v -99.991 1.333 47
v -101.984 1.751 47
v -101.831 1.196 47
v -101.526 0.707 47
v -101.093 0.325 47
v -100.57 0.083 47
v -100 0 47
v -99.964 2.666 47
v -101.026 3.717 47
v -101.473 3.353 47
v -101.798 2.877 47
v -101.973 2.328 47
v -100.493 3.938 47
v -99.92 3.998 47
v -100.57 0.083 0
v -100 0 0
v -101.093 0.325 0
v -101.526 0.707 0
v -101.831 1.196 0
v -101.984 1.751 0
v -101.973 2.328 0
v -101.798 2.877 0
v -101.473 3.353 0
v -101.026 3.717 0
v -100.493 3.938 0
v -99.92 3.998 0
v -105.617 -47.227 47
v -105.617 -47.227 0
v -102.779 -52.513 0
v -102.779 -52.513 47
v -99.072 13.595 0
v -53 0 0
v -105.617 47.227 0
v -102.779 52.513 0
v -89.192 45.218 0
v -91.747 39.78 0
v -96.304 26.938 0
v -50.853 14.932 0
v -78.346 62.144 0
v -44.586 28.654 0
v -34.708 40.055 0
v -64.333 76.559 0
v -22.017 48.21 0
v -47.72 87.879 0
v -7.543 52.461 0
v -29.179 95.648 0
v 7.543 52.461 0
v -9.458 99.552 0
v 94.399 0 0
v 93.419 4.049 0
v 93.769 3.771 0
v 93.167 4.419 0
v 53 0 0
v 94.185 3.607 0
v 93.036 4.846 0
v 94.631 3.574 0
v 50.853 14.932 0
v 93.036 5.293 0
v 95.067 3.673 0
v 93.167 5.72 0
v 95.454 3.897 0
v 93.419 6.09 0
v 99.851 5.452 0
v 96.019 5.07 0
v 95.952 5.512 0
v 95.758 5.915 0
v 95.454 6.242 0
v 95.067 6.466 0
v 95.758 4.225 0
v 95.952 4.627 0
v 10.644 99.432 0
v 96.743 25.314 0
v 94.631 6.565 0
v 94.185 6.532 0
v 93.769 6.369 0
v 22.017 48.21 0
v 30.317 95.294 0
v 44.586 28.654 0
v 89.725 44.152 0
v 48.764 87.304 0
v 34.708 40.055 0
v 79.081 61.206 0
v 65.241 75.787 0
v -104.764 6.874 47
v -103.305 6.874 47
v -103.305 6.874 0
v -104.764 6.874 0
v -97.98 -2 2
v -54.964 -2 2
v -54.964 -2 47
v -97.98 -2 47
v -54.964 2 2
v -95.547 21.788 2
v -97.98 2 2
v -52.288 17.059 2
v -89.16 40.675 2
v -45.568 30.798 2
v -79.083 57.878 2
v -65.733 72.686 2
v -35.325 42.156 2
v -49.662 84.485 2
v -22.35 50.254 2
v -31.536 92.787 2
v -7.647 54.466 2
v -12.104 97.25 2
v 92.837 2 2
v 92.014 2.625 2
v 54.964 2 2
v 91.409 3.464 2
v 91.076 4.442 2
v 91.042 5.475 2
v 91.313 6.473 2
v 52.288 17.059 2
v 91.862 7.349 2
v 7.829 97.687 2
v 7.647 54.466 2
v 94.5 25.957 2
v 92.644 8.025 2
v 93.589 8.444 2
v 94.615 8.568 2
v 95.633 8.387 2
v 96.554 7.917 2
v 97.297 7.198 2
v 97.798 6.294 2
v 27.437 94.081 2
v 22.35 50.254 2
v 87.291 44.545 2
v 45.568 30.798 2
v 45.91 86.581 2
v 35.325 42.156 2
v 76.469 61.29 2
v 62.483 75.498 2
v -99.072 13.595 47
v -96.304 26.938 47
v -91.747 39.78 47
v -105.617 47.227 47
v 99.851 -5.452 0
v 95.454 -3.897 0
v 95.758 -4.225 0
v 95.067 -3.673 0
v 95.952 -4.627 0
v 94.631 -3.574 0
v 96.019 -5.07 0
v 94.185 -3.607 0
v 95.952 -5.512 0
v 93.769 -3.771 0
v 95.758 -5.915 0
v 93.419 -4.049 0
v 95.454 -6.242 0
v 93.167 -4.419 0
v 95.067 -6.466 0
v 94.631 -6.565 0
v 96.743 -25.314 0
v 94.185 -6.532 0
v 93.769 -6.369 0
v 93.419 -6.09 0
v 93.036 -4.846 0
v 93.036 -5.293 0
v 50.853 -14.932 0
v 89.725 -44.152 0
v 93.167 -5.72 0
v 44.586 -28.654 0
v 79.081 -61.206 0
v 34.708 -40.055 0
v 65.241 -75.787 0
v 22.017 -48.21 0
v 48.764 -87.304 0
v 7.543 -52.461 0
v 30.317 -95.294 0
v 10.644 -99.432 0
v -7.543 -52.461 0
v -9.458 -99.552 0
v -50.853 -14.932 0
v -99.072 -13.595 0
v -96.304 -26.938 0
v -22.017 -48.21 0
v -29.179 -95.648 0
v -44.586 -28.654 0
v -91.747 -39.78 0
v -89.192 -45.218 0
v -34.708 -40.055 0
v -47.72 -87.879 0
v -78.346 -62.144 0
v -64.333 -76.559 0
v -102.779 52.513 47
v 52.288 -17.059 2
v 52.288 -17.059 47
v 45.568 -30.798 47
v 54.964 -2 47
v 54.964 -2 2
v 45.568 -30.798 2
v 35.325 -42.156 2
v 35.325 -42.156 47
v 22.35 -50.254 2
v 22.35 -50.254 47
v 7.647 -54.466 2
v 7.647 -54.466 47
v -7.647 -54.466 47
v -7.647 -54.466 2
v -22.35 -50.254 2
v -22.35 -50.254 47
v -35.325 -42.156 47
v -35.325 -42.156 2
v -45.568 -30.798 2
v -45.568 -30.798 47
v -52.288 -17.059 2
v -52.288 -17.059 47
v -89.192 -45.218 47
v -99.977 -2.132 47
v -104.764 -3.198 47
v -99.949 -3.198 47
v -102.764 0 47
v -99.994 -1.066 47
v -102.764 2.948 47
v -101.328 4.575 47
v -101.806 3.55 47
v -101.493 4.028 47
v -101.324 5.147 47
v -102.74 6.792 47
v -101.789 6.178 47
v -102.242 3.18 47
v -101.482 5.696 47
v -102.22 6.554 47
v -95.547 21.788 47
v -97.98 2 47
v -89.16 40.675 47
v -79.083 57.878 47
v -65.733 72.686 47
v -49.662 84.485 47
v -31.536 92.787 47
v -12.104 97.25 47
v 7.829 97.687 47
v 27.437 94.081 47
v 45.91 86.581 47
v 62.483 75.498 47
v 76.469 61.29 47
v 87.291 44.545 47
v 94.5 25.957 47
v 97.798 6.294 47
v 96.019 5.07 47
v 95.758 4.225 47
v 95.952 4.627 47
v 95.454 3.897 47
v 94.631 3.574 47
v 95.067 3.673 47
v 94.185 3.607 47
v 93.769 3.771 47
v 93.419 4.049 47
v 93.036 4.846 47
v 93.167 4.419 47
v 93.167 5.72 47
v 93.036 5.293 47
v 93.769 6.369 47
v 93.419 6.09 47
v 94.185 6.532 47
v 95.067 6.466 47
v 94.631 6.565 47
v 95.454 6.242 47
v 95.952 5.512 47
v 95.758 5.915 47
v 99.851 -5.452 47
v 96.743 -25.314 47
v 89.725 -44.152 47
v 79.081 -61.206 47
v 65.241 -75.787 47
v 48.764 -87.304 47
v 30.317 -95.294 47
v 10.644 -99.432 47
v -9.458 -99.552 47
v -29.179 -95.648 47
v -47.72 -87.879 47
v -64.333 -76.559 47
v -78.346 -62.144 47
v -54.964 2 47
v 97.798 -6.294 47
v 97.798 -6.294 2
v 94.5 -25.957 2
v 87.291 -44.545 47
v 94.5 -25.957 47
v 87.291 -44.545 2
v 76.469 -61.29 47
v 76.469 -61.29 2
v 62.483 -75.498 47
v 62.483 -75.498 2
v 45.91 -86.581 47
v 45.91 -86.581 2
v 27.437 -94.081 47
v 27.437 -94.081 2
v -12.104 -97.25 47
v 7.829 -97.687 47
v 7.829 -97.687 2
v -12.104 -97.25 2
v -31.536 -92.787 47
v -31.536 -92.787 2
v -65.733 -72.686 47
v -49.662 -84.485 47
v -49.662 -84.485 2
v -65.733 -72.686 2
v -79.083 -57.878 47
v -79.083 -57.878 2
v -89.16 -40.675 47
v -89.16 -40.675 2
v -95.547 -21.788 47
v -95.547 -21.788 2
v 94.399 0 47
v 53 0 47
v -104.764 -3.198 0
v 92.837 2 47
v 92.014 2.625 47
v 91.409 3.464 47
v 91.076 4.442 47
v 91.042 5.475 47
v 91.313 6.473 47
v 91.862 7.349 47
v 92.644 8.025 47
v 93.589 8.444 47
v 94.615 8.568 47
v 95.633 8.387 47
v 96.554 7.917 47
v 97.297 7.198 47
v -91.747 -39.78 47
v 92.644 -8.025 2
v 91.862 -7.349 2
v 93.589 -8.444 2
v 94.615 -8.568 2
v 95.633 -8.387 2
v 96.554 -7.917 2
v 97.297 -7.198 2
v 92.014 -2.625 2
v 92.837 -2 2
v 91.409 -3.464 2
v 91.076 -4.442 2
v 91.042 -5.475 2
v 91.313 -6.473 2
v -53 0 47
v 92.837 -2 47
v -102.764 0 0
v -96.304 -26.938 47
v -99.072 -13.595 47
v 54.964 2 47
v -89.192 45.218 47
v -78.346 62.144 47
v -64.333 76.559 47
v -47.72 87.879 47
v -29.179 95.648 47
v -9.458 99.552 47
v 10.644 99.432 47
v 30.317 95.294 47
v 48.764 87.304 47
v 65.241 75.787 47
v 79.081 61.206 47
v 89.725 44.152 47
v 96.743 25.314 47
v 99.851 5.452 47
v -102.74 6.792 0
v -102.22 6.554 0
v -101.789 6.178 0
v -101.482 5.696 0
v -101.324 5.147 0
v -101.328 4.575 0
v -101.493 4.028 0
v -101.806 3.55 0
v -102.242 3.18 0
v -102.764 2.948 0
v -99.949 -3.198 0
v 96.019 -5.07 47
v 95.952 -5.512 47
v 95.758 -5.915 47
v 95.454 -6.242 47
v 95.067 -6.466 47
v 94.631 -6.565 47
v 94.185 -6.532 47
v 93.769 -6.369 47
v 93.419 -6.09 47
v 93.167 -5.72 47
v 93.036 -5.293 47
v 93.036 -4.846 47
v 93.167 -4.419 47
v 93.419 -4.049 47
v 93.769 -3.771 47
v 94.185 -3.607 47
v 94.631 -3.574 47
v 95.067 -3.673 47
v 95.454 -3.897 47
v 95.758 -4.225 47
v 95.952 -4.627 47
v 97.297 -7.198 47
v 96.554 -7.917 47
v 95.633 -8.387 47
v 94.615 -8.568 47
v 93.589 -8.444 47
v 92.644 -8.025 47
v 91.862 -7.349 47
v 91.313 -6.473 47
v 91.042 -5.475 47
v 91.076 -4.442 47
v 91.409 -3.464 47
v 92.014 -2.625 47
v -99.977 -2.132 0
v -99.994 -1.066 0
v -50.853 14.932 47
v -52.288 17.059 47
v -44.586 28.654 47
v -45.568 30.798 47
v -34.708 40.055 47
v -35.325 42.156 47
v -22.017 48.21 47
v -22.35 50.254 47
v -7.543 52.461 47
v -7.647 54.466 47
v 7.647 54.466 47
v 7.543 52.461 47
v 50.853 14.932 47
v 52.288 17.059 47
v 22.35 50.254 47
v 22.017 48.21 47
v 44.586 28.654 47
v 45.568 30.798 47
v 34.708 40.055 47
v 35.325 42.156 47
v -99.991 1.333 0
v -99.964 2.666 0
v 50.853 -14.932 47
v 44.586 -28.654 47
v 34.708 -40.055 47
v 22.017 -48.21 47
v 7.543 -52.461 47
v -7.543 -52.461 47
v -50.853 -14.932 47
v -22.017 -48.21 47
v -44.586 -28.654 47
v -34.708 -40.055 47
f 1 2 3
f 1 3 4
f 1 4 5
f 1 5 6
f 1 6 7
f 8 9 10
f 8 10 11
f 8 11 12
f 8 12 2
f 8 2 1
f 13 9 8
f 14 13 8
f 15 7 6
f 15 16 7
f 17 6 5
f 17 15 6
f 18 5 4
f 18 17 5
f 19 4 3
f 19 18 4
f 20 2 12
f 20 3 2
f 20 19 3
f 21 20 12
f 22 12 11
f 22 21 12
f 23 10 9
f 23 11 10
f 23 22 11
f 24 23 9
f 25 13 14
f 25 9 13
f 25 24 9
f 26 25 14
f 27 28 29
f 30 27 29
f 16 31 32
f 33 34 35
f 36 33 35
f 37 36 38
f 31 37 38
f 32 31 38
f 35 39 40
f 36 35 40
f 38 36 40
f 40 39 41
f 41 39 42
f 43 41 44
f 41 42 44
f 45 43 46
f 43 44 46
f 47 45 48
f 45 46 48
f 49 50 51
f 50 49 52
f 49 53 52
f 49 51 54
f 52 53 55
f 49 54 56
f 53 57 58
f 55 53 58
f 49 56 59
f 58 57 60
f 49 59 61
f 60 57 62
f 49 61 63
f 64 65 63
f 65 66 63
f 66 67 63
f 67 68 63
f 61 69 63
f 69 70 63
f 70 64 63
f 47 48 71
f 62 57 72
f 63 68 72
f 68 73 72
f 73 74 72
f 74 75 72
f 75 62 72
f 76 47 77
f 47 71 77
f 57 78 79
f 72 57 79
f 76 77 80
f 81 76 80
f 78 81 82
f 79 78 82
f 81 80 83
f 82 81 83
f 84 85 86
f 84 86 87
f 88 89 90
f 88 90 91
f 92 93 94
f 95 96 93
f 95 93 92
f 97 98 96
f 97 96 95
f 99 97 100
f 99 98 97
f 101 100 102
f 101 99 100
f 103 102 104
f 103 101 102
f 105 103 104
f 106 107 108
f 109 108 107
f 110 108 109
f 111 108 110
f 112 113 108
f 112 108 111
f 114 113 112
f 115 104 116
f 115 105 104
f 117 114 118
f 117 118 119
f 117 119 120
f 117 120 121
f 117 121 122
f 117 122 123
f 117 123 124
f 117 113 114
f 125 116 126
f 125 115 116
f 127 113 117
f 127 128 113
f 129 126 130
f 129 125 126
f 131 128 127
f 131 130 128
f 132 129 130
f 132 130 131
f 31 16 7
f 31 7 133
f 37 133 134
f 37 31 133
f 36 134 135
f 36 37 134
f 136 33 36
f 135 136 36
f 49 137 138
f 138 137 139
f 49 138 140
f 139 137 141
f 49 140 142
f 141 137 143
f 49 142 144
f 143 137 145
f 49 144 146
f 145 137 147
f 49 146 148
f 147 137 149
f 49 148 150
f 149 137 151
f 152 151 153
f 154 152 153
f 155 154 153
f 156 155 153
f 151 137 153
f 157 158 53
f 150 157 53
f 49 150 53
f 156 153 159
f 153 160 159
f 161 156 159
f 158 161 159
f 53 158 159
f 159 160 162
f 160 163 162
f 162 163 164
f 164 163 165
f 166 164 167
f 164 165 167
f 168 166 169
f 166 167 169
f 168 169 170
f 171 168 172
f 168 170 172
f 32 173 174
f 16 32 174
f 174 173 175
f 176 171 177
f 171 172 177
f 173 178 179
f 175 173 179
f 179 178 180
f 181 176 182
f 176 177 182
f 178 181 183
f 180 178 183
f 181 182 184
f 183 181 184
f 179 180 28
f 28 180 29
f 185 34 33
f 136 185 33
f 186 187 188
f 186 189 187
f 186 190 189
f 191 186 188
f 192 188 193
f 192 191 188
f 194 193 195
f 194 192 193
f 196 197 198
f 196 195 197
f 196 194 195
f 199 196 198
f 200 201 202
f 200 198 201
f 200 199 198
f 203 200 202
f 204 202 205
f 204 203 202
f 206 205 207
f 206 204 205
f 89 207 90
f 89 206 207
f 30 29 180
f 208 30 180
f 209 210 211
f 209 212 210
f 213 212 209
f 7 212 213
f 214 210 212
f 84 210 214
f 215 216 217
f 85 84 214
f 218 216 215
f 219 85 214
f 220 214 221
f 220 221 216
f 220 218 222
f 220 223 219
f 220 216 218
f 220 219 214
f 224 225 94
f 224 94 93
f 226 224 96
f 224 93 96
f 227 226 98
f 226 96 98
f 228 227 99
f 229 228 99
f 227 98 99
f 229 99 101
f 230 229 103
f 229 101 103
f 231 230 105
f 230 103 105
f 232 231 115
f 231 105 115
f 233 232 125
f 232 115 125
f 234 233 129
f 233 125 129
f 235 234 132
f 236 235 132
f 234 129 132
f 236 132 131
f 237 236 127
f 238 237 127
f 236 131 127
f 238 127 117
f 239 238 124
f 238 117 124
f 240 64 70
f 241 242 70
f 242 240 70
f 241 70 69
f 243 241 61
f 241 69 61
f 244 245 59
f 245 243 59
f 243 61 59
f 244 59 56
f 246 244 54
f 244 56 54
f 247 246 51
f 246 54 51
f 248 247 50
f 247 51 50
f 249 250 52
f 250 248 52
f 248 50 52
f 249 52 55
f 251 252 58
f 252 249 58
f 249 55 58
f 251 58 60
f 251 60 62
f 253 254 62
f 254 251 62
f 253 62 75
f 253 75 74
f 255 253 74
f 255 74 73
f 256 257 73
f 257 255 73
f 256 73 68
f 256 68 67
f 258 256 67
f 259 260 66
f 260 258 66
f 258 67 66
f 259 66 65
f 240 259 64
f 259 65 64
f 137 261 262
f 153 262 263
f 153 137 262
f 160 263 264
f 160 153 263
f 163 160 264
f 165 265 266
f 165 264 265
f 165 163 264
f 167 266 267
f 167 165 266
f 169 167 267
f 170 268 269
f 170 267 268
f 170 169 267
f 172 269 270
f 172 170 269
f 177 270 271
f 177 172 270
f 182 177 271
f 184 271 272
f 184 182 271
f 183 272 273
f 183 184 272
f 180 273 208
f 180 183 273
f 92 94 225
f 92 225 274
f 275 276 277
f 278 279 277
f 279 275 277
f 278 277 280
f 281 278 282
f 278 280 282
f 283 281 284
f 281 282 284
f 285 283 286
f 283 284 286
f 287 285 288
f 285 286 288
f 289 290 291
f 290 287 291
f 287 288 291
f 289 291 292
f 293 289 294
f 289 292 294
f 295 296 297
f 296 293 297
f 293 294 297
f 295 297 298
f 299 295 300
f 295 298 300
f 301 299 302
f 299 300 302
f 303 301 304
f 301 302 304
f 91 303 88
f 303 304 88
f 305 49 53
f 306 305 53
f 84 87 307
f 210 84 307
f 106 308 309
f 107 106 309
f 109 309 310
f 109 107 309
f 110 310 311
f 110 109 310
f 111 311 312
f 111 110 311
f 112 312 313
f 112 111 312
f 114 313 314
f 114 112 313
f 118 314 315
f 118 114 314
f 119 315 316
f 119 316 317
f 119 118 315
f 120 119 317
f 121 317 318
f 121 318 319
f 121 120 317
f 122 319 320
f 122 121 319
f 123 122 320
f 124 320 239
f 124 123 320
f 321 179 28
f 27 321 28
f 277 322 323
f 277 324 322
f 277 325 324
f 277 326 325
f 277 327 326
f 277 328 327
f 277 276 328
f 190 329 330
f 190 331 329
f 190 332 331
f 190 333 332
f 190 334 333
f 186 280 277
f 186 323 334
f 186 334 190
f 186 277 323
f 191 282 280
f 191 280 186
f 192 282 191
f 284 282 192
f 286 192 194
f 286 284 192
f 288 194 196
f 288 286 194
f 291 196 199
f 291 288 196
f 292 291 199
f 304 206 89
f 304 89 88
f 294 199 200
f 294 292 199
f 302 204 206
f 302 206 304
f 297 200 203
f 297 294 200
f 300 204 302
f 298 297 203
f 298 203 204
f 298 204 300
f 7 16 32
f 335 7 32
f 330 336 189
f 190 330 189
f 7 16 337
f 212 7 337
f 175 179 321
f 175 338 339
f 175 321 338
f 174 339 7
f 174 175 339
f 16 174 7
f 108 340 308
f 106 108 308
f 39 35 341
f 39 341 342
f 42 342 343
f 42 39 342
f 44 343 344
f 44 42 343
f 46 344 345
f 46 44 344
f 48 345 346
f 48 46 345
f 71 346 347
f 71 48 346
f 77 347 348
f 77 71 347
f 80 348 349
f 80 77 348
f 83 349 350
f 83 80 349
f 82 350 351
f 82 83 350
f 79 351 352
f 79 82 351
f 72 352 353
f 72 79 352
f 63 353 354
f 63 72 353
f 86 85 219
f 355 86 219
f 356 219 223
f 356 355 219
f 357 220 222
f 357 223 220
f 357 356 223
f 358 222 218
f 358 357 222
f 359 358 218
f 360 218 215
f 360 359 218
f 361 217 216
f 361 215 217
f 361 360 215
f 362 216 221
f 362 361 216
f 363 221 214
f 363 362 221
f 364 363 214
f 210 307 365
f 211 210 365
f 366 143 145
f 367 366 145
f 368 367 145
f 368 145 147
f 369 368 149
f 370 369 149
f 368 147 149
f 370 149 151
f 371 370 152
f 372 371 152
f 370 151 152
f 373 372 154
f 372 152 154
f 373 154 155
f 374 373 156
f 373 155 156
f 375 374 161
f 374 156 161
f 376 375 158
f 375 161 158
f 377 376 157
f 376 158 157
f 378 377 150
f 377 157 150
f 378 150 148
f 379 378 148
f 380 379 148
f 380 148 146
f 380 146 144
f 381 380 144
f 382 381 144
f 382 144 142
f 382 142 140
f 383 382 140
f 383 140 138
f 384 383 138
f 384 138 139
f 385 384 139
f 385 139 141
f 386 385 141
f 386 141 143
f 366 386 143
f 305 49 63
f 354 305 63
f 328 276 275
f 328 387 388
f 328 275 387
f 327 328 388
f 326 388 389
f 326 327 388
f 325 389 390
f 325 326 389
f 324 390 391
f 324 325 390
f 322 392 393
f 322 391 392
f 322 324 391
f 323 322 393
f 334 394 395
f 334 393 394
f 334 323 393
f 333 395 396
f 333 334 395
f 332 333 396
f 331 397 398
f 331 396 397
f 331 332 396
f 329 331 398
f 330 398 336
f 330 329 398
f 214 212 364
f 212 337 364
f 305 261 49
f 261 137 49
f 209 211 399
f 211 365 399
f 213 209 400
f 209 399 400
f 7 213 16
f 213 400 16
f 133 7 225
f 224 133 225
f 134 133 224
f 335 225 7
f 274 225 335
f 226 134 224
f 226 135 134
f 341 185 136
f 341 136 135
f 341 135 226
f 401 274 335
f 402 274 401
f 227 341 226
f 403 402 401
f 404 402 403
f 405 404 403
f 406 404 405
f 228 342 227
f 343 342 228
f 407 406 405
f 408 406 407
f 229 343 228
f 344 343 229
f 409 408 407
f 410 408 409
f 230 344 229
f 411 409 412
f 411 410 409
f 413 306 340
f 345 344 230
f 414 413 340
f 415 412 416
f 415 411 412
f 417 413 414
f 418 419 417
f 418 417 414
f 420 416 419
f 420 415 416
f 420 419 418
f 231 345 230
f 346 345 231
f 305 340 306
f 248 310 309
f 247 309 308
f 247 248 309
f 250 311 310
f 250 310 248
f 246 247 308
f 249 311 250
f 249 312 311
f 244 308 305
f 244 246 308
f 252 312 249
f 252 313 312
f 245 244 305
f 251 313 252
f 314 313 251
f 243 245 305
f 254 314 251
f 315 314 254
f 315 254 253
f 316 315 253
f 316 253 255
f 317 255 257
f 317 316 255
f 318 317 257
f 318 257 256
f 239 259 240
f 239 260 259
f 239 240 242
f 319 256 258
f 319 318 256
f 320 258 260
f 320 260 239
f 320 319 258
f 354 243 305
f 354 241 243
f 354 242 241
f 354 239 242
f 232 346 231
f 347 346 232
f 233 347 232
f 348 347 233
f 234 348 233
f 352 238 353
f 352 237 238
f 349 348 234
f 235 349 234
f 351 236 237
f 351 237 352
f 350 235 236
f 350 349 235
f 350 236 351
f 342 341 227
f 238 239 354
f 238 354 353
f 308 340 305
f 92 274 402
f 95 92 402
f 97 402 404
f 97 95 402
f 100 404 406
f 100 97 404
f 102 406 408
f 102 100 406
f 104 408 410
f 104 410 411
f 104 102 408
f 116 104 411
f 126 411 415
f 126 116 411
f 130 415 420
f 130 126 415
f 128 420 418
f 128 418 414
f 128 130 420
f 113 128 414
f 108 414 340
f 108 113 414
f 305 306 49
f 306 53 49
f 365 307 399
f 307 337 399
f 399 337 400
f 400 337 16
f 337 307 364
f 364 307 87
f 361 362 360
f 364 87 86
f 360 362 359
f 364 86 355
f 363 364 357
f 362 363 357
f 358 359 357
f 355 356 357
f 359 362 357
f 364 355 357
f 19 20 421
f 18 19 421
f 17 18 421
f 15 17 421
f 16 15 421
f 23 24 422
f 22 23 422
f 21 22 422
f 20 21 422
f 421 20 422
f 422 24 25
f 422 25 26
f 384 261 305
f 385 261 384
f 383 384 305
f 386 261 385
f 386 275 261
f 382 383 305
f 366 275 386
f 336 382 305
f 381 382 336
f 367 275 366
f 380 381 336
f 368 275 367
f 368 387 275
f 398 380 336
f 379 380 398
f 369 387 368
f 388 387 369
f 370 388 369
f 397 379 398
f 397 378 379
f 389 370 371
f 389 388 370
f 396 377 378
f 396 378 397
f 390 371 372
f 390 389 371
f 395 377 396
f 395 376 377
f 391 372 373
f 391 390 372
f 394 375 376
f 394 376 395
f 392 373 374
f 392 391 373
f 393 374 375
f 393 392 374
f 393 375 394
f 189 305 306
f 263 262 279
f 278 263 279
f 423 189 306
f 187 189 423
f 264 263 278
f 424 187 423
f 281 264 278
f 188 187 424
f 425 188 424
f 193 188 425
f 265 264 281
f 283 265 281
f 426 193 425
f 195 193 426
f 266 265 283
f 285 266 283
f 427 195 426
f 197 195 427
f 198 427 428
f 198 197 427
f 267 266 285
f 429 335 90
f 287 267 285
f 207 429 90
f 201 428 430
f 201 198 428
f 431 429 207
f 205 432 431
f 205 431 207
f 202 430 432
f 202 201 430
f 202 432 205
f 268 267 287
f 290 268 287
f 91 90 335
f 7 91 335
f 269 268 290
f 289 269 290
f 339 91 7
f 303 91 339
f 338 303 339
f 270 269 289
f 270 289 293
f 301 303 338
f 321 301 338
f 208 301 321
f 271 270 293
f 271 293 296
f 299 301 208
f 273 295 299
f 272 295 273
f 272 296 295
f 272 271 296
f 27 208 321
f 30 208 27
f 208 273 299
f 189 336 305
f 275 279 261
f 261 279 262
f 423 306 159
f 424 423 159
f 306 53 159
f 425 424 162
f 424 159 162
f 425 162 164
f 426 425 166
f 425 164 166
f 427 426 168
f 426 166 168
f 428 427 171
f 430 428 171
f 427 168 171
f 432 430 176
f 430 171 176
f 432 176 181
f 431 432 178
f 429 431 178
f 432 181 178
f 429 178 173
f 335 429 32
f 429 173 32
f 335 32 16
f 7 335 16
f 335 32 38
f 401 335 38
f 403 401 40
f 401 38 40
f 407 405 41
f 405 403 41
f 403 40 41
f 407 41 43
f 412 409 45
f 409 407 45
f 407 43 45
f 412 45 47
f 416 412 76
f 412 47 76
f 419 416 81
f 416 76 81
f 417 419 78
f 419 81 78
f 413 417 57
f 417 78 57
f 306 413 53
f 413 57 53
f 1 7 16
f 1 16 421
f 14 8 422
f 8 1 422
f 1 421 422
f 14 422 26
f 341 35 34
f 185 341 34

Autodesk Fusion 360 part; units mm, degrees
sketch "Sketch1" plane through (0, 0, 0) normal (0, 0, 1) x (1, 0, 0)
  arc A0 (100, 0) -> (-100, 0) centre (0, 0) ccw
  line L0 (0, 0) -> (100, 0) construction
  line L1 (0, 0) -> (-100, 0) construction
  arc A1 (53, 0) -> (-53, 0) centre (0, 0) ccw
  line L2 (0, 0) -> (53, 0) construction
  line L3 (0, 0) -> (-53, 0) construction
  line L4 (-100, 0) -> (-53, 0)
  line L5 (53, 0) -> (100, 0)
  line L6 (94.399, 0) -> (99.8513, 5.4523)
  line L7 (94.399, 0) -> (102.1097, 0) construction
  line L8 (-89.1925, 45.2184) -> (-102.7789, 52.5129)
  line L9 (-102.7789, 52.5129) -> (-105.6171, 47.2267)
  line L10 (-105.6171, 47.2267) -> (-91.7472, 39.78)
  circle A2 centre (94.5188, 5.0696) radius 1.5
  circle A3 centre (94.5188, 5.0696) radius 2.5
  dimension "d1" = 100
  dimension "d5" = 47
  dimension "d6" = 45
  dimension "d7" = 6
  dimension "d11" = 3
  dimension "d12" = 2
  dimension "d13" = 5
extrude "Extrude1" add sketch "Sketch1" along normal blind 47 contours A0 A1 L4 L5 L6 | A3 makes body 1
shell "Shell1" thickness 2 removed faces 1 at (80.8693, 23.265, 47) on bodies 1
extrude "Extrude2" add sketch "Sketch1" along normal up to surface (47 mm away) contours A0 L8 L9 L10 bodies 1
mirror "Mirror1" about plane through (0, 0, 0) normal (0, 1, 0) of bodies 1 makes body 2
sketch "Sketch2" plane through (0, 0, 0) normal (0, 0, 1) x (1, 0, 0)
  arc A0 (100, 0) -> (-100, 0) centre (0, 0) ccw
  arc A1 (-100, 0) -> (-91.7472, -39.78) centre (0, 0) ccw
  arc A2 (-99.3608, 3.8951) -> (-100, 0) centre (-100, 2) ccw
  line L0 (-100, 0) -> (-102.7643, 0)
  line L1 (-102.7643, 0) -> (-102.7643, 2.9485)
  arc A3 (-99.8526, 5.4275) -> (-99.8385, 5.6804) centre (-101.6525, 5.6545) ccw
  arc A4 (-102.7643, 2.9485) -> (-103.3053, 6.8739) centre (-103.3053, 4.8739) ccw
  line L2 (-103.3053, 6.8739) -> (-104.7643, 6.8739)
  line L3 (-104.7643, 6.8739) -> (-104.7643, -3.198)
  line L4 (-104.7643, -3.198) -> (-99.9489, -3.198)
  line L5 (-100, 0) -> (-53, 0)
  dimension "d17" = 2
  dimension "d18" = 2
  dimension "d19" = 2
extrude "Extrude3" add sketch "Sketch2" along normal up to surface (47 mm away) separate body contours A1 L0 L1 A4 L2 L3 L4 makes body 3
extrude "Extrude4" add sketch "Sketch2" along normal up to surface (47 mm away) separate body contours A0 A2 makes body 4
